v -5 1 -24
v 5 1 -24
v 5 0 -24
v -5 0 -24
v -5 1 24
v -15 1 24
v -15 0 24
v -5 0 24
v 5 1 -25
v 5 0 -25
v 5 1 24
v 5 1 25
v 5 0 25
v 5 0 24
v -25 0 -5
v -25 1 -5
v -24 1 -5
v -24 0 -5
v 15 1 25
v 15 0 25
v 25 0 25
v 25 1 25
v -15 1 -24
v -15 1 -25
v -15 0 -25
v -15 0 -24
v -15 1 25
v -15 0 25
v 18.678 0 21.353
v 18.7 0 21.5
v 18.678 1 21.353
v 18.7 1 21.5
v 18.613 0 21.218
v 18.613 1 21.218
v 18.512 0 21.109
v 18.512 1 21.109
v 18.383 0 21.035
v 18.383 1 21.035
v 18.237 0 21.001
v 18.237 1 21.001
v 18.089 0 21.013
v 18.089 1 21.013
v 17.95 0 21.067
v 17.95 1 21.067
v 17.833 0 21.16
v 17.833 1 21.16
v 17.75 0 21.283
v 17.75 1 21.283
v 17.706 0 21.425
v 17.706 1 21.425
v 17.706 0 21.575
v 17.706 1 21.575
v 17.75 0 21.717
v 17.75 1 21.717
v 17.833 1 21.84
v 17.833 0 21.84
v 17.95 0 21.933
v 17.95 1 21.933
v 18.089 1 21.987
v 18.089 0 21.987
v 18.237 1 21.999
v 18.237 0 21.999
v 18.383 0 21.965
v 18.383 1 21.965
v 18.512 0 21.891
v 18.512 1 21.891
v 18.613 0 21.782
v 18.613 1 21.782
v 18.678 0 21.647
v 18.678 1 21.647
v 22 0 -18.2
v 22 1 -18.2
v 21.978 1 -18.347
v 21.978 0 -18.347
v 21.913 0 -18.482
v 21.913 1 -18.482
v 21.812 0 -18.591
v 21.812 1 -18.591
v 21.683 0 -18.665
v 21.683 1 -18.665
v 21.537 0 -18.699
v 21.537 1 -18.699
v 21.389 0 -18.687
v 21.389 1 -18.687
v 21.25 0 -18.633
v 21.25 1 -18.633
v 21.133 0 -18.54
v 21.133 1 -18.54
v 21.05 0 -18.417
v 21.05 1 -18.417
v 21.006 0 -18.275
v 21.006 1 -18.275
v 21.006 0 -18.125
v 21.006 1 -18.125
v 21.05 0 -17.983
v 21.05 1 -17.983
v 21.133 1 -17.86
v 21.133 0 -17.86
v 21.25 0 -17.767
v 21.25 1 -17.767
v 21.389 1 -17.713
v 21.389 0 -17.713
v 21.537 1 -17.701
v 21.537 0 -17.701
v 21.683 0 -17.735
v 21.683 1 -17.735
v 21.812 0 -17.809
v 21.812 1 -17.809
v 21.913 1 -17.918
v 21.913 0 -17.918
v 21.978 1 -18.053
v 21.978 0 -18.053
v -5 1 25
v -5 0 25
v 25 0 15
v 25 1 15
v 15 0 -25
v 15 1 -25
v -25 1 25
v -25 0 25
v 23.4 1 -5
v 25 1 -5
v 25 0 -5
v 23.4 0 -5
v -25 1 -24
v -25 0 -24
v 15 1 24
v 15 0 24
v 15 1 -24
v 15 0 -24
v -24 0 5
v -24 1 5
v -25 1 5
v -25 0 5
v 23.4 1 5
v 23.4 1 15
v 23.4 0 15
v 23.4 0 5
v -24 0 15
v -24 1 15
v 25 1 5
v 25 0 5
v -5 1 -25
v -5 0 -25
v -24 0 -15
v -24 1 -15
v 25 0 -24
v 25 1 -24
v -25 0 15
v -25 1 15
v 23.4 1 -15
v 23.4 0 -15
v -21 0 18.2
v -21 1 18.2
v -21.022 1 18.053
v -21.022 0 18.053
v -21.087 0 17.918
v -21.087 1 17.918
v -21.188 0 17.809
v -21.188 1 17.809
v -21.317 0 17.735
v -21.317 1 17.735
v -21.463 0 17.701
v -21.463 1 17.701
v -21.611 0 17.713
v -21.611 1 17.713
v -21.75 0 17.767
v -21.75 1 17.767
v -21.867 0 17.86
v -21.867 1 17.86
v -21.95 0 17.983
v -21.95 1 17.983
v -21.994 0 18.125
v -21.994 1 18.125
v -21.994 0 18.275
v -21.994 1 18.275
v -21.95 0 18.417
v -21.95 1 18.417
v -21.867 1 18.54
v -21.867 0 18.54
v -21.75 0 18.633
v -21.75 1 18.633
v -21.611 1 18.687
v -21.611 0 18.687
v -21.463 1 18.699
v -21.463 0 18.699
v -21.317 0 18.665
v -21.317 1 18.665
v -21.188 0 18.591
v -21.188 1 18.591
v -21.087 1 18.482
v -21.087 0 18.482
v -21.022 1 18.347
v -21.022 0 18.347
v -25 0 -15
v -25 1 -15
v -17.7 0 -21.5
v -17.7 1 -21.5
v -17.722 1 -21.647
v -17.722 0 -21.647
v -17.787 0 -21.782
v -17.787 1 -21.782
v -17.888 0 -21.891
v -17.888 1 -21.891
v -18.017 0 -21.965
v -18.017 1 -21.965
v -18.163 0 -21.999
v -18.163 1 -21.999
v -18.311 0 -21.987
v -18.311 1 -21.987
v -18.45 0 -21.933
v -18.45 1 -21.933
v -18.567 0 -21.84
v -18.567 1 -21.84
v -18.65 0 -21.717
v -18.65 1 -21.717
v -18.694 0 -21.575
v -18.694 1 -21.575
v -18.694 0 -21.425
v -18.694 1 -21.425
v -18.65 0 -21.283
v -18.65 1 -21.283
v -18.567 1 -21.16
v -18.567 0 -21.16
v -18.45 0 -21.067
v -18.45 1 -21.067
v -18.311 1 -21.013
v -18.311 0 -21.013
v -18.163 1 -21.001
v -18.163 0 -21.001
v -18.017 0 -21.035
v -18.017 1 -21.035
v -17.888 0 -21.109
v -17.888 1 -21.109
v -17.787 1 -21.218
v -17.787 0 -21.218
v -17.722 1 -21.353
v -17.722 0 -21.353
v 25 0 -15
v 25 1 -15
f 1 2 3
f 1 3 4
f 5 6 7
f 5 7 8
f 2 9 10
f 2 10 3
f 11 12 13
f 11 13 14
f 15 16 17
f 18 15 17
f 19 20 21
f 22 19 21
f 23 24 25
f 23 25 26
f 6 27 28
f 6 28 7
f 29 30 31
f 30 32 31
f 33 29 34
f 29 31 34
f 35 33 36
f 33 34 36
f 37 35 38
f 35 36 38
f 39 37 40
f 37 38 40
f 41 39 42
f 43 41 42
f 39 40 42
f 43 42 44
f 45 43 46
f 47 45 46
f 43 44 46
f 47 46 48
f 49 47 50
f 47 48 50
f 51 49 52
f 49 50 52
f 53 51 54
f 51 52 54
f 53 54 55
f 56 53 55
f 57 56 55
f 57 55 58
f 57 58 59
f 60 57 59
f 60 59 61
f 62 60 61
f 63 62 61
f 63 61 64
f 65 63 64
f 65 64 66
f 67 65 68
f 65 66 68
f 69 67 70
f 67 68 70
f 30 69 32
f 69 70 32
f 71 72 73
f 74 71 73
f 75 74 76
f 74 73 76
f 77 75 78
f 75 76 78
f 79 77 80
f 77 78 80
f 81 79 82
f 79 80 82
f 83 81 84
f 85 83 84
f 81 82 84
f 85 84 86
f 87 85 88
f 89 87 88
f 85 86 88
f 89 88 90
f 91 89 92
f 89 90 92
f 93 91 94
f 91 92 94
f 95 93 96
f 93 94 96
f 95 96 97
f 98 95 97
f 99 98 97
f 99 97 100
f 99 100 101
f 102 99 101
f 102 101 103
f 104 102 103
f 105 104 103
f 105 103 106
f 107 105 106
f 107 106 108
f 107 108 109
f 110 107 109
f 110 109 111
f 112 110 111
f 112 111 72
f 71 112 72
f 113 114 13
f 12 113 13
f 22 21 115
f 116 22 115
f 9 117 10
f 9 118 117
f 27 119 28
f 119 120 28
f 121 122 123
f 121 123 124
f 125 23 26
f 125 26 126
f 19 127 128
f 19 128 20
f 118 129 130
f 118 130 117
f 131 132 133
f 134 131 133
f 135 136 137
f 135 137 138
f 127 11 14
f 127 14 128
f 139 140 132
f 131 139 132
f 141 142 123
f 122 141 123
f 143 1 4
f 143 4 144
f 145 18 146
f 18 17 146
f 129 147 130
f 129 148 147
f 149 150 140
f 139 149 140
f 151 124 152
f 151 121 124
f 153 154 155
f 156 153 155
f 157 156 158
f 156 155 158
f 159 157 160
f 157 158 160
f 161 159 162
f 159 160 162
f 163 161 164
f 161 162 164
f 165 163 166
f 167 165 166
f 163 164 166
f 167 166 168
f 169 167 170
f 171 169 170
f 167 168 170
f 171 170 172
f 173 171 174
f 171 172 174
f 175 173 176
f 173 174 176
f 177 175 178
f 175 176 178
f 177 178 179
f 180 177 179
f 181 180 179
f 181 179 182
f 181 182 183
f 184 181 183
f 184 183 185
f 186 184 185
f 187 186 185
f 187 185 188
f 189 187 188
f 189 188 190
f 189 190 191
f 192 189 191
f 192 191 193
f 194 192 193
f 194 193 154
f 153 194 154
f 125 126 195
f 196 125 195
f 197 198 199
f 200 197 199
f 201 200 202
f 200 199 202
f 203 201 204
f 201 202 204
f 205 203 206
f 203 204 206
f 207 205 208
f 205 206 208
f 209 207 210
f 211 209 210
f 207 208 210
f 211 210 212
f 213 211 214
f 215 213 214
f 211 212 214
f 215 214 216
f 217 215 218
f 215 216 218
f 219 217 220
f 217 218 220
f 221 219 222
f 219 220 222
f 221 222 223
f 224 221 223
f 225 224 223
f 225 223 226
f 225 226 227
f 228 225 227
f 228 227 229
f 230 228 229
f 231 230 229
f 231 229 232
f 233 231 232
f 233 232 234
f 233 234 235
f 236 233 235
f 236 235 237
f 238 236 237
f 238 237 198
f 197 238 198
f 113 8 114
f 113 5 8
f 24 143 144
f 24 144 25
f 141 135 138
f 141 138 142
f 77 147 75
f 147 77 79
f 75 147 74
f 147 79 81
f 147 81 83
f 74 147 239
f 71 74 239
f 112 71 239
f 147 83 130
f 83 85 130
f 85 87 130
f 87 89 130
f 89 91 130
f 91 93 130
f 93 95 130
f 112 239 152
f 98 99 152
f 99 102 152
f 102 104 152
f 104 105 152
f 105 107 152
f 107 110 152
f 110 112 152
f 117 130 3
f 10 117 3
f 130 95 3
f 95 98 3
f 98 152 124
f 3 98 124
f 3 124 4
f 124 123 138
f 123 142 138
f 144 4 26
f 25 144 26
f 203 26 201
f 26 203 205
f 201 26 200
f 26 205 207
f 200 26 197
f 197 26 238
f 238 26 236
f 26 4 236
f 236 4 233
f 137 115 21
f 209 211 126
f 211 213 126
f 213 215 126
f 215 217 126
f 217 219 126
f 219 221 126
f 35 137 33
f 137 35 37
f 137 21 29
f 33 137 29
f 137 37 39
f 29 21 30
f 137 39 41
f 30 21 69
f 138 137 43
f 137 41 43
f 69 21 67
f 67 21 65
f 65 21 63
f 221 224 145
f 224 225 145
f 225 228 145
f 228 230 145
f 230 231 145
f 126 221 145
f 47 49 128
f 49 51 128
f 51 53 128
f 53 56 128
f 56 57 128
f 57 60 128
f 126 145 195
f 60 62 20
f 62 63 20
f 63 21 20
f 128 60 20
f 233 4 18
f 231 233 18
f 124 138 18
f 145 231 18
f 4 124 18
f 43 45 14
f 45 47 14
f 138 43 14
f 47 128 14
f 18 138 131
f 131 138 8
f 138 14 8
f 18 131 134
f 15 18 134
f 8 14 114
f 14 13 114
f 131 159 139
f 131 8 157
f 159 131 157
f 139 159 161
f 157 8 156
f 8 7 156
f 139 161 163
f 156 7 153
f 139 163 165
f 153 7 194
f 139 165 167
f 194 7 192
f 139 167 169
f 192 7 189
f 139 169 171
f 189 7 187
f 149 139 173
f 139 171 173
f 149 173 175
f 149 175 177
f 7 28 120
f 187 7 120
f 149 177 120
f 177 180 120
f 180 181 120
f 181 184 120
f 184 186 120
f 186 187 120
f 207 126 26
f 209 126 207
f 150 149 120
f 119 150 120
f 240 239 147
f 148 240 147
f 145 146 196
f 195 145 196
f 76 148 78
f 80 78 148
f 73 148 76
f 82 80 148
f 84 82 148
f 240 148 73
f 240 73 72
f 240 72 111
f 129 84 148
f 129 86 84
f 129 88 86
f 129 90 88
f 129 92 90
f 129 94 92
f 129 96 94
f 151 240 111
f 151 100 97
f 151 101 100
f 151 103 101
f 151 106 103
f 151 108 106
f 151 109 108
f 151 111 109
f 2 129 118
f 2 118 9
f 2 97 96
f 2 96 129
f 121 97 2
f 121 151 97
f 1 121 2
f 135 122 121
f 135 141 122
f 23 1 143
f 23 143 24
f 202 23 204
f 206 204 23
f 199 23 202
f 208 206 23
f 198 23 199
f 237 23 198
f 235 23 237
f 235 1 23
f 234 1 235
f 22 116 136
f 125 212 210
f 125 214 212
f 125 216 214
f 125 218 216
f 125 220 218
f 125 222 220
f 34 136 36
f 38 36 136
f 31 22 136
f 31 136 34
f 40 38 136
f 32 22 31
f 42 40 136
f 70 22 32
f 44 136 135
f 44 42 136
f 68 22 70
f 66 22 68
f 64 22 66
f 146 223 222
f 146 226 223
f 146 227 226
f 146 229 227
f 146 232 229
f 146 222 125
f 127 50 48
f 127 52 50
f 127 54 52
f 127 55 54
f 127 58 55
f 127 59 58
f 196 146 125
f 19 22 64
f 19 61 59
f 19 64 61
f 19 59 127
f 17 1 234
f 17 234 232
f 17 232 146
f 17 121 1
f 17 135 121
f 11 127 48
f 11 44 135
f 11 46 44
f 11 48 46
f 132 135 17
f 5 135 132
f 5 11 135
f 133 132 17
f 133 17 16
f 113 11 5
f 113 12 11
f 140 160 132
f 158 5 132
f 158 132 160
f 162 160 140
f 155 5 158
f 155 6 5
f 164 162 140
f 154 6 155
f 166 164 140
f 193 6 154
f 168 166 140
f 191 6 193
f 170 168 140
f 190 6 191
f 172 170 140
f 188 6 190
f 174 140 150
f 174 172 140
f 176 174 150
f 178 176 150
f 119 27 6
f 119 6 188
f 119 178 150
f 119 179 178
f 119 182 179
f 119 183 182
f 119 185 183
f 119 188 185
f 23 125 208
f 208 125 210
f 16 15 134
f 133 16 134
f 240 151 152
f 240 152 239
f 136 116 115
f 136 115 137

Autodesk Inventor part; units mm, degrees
ref_plane "YZ Plane" through (0, 0, 0) normal (1, 0, 0) x (0, 1, 0)
ref_plane "XZ Plane" through (0, 0, 0) normal (0, 1, 0) x (-1, 0, 0)
ref_plane "XY Plane" through (0, 0, 0) normal (0, 0, 1) x (1, 0, 0)
sketch "Sketch1" plane through (0, 0, 0) normal (0, 1, 0) x (-1, 0, 0)
  line L0 (-25, -25) -> (25, -25)
  line L1 (25, -25) -> (25, 25)
  line L2 (25, 25) -> (-25, 25)
  line L3 (-25, 25) -> (-25, -25)
  line L4 (-25, -25) -> (25, 25) construction
  line L5 (25, -25) -> (-25, 25) construction
  point P0 (0, 0)
  dimension "d0" = 50
  dimension "d1" = 50
extrude "Extrusion1" add sketch "Sketch1" along normal blind 1
sketch "Sketch2" plane through (0, 1, 0) normal (0, 1, 0) x (1, 0, 0)
  line L0 (25, -25) -> (25, -15)
  line L1 (25, -25) -> (25, 25) projected
  line L2 (25, -15) -> (23.4, -15)
  line L3 (23.4, -15) -> (23.4, -5)
  line L4 (23.4, -5) -> (25, -5)
  line L5 (25, -5) -> (25, 5)
  line L6 (25, 5) -> (23.4, 5)
  line L7 (23.4, 5) -> (23.4, 15)
  line L8 (23.4, 15) -> (25, 15)
  line L9 (25, 15) -> (25, 25)
  line L10 (27, 25) -> (27, -25)
  line L11 (27, -25) -> (25, -25)
  point P0 (0, 0)
  dimension "d4" = 1.6
  dimension "d5" = 10
  dimension "d6" = 10
extrude "Extrusion2" cut sketch "Sketch2" against normal blind 1
sketch "Sketch3" plane through (0, 1, 0) normal (0, 1, 0) x (1, 0, 0)
  line L0 (25, 25) -> (25, 24)
  line L1 (25, 24) -> (15, 24)
  line L2 (15, 24) -> (15, 25)
  line L3 (25, 25) -> (-25, 25) projected
  line L4 (15, 25) -> (5, 25)
  line L5 (5, 25) -> (5, 24)
  line L6 (5, 24) -> (-5, 24)
  line L7 (-5, 24) -> (-5, 25)
  line L8 (-5, 25) -> (-15, 25)
  line L9 (-15, 25) -> (-15, 24)
  line L10 (-15, 24) -> (-25, 24)
  line L11 (-25, 24) -> (-25, 27)
  line L12 (-25, 27) -> (25, 27)
  line L13 (25, 27) -> (25, 25)
  point P0 (0, 0)
extrude "Extrusion3" cut sketch "Sketch3" against normal blind 1
sketch "Sketch4" plane through (0, 1, 0) normal (0, 1, 0) x (1, 0, 0)
  line L0 (-25, -25) -> (-25, -15)
  line L1 (-25, -15) -> (-24, -15)
  line L2 (-24, -15) -> (-24, -5)
  line L3 (-24, -5) -> (-25, -5)
  line L4 (-25, 24) -> (-25, -25) projected
  line L5 (-25, -5) -> (-25, 5)
  line L6 (-25, 24) -> (-25, -25) projected
  line L7 (-25, 5) -> (-24, 5)
  line L8 (-24, 5) -> (-24, 15)
  line L9 (-24, 15) -> (-25, 15)
  line L10 (-25, 24) -> (-27, 23)
  line L11 (-27, 23) -> (-27, -24.2648)
  line L12 (-27, -24.2648) -> (-25, -25)
  point P0 (0, 0)
  dimension "d11" = 10
  dimension "d12" = 10
  dimension "d13" = 10
extrude "Extrusion4" cut sketch "Sketch4" against normal blind 1 contours L4 L3 L2 L1 | L4 L9 L8 L7
sketch "Sketch5" plane through (0, 1, 0) normal (0, 1, 0) x (1, 0, 0)
  line L0 (-25, -25) -> (-15, -25)
  line L1 (-25, -25) -> (25, -25) projected
  line L2 (-15, -25) -> (-15, -24)
  line L3 (-15, -24) -> (-5, -24)
  line L4 (-5, -24) -> (-5, -25)
  line L5 (-5, -25) -> (5, -25)
  line L6 (5, -25) -> (5, -24)
  line L7 (5, -24) -> (15, -24)
  line L8 (15, -24) -> (15, -25)
  line L9 (25, -25) -> (25, -26)
  line L10 (25, -26) -> (-25, -26)
  line L11 (-25, -26) -> (-25, -25)
  point P0 (0, 0)
  dimension "d16" = 10
extrude "Extrusion5" cut sketch "Sketch5" against normal blind 1 contours L2 L3 L4 L1 | L6 L7 L8 L1
sketch "Sketch6" plane through (0, 1, 0) normal (0, 1, 0) x (1, 0, 0)
  circle A0 centre (-21.5, -18.2) radius 0.5
  circle A1 centre (-18.2, 21.5) radius 0.5
  circle A2 centre (18.2, -21.5) radius 0.5
  circle A3 centre (21.5, 18.2) radius 0.5
  line L0 (15, -25) -> (25, -25) projected
  line L1 (25, -25) -> (25, -15) projected
  line L2 (-25, -25) -> (-15, -25) projected
  line L3 (-25, -15) -> (-25, -25) projected
  line L4 (-5, 25) -> (-15, 25) projected
  line L5 (-25, 24) -> (-25, 15) projected
  line L6 (25, 24) -> (15, 24) projected
  line L7 (25, 15) -> (25, 24) projected
  point P0 (0, 0)
  dimension "d21" = 1
  dimension "d22" = 1
  dimension "d23" = 1
  dimension "d24" = 1
  dimension "d25" = 3.5
  dimension "d26" = 6.8
  dimension "d27" = 6.8
  dimension "d28" = 3.5
  dimension "d29" = 3.5
  dimension "d30" = 6.8
  dimension "d31" = 5.8
  dimension "d32" = 3.5
extrude "Extrusion6" cut sketch "Sketch6" against normal blind 1
properties part number "Side Panel"
